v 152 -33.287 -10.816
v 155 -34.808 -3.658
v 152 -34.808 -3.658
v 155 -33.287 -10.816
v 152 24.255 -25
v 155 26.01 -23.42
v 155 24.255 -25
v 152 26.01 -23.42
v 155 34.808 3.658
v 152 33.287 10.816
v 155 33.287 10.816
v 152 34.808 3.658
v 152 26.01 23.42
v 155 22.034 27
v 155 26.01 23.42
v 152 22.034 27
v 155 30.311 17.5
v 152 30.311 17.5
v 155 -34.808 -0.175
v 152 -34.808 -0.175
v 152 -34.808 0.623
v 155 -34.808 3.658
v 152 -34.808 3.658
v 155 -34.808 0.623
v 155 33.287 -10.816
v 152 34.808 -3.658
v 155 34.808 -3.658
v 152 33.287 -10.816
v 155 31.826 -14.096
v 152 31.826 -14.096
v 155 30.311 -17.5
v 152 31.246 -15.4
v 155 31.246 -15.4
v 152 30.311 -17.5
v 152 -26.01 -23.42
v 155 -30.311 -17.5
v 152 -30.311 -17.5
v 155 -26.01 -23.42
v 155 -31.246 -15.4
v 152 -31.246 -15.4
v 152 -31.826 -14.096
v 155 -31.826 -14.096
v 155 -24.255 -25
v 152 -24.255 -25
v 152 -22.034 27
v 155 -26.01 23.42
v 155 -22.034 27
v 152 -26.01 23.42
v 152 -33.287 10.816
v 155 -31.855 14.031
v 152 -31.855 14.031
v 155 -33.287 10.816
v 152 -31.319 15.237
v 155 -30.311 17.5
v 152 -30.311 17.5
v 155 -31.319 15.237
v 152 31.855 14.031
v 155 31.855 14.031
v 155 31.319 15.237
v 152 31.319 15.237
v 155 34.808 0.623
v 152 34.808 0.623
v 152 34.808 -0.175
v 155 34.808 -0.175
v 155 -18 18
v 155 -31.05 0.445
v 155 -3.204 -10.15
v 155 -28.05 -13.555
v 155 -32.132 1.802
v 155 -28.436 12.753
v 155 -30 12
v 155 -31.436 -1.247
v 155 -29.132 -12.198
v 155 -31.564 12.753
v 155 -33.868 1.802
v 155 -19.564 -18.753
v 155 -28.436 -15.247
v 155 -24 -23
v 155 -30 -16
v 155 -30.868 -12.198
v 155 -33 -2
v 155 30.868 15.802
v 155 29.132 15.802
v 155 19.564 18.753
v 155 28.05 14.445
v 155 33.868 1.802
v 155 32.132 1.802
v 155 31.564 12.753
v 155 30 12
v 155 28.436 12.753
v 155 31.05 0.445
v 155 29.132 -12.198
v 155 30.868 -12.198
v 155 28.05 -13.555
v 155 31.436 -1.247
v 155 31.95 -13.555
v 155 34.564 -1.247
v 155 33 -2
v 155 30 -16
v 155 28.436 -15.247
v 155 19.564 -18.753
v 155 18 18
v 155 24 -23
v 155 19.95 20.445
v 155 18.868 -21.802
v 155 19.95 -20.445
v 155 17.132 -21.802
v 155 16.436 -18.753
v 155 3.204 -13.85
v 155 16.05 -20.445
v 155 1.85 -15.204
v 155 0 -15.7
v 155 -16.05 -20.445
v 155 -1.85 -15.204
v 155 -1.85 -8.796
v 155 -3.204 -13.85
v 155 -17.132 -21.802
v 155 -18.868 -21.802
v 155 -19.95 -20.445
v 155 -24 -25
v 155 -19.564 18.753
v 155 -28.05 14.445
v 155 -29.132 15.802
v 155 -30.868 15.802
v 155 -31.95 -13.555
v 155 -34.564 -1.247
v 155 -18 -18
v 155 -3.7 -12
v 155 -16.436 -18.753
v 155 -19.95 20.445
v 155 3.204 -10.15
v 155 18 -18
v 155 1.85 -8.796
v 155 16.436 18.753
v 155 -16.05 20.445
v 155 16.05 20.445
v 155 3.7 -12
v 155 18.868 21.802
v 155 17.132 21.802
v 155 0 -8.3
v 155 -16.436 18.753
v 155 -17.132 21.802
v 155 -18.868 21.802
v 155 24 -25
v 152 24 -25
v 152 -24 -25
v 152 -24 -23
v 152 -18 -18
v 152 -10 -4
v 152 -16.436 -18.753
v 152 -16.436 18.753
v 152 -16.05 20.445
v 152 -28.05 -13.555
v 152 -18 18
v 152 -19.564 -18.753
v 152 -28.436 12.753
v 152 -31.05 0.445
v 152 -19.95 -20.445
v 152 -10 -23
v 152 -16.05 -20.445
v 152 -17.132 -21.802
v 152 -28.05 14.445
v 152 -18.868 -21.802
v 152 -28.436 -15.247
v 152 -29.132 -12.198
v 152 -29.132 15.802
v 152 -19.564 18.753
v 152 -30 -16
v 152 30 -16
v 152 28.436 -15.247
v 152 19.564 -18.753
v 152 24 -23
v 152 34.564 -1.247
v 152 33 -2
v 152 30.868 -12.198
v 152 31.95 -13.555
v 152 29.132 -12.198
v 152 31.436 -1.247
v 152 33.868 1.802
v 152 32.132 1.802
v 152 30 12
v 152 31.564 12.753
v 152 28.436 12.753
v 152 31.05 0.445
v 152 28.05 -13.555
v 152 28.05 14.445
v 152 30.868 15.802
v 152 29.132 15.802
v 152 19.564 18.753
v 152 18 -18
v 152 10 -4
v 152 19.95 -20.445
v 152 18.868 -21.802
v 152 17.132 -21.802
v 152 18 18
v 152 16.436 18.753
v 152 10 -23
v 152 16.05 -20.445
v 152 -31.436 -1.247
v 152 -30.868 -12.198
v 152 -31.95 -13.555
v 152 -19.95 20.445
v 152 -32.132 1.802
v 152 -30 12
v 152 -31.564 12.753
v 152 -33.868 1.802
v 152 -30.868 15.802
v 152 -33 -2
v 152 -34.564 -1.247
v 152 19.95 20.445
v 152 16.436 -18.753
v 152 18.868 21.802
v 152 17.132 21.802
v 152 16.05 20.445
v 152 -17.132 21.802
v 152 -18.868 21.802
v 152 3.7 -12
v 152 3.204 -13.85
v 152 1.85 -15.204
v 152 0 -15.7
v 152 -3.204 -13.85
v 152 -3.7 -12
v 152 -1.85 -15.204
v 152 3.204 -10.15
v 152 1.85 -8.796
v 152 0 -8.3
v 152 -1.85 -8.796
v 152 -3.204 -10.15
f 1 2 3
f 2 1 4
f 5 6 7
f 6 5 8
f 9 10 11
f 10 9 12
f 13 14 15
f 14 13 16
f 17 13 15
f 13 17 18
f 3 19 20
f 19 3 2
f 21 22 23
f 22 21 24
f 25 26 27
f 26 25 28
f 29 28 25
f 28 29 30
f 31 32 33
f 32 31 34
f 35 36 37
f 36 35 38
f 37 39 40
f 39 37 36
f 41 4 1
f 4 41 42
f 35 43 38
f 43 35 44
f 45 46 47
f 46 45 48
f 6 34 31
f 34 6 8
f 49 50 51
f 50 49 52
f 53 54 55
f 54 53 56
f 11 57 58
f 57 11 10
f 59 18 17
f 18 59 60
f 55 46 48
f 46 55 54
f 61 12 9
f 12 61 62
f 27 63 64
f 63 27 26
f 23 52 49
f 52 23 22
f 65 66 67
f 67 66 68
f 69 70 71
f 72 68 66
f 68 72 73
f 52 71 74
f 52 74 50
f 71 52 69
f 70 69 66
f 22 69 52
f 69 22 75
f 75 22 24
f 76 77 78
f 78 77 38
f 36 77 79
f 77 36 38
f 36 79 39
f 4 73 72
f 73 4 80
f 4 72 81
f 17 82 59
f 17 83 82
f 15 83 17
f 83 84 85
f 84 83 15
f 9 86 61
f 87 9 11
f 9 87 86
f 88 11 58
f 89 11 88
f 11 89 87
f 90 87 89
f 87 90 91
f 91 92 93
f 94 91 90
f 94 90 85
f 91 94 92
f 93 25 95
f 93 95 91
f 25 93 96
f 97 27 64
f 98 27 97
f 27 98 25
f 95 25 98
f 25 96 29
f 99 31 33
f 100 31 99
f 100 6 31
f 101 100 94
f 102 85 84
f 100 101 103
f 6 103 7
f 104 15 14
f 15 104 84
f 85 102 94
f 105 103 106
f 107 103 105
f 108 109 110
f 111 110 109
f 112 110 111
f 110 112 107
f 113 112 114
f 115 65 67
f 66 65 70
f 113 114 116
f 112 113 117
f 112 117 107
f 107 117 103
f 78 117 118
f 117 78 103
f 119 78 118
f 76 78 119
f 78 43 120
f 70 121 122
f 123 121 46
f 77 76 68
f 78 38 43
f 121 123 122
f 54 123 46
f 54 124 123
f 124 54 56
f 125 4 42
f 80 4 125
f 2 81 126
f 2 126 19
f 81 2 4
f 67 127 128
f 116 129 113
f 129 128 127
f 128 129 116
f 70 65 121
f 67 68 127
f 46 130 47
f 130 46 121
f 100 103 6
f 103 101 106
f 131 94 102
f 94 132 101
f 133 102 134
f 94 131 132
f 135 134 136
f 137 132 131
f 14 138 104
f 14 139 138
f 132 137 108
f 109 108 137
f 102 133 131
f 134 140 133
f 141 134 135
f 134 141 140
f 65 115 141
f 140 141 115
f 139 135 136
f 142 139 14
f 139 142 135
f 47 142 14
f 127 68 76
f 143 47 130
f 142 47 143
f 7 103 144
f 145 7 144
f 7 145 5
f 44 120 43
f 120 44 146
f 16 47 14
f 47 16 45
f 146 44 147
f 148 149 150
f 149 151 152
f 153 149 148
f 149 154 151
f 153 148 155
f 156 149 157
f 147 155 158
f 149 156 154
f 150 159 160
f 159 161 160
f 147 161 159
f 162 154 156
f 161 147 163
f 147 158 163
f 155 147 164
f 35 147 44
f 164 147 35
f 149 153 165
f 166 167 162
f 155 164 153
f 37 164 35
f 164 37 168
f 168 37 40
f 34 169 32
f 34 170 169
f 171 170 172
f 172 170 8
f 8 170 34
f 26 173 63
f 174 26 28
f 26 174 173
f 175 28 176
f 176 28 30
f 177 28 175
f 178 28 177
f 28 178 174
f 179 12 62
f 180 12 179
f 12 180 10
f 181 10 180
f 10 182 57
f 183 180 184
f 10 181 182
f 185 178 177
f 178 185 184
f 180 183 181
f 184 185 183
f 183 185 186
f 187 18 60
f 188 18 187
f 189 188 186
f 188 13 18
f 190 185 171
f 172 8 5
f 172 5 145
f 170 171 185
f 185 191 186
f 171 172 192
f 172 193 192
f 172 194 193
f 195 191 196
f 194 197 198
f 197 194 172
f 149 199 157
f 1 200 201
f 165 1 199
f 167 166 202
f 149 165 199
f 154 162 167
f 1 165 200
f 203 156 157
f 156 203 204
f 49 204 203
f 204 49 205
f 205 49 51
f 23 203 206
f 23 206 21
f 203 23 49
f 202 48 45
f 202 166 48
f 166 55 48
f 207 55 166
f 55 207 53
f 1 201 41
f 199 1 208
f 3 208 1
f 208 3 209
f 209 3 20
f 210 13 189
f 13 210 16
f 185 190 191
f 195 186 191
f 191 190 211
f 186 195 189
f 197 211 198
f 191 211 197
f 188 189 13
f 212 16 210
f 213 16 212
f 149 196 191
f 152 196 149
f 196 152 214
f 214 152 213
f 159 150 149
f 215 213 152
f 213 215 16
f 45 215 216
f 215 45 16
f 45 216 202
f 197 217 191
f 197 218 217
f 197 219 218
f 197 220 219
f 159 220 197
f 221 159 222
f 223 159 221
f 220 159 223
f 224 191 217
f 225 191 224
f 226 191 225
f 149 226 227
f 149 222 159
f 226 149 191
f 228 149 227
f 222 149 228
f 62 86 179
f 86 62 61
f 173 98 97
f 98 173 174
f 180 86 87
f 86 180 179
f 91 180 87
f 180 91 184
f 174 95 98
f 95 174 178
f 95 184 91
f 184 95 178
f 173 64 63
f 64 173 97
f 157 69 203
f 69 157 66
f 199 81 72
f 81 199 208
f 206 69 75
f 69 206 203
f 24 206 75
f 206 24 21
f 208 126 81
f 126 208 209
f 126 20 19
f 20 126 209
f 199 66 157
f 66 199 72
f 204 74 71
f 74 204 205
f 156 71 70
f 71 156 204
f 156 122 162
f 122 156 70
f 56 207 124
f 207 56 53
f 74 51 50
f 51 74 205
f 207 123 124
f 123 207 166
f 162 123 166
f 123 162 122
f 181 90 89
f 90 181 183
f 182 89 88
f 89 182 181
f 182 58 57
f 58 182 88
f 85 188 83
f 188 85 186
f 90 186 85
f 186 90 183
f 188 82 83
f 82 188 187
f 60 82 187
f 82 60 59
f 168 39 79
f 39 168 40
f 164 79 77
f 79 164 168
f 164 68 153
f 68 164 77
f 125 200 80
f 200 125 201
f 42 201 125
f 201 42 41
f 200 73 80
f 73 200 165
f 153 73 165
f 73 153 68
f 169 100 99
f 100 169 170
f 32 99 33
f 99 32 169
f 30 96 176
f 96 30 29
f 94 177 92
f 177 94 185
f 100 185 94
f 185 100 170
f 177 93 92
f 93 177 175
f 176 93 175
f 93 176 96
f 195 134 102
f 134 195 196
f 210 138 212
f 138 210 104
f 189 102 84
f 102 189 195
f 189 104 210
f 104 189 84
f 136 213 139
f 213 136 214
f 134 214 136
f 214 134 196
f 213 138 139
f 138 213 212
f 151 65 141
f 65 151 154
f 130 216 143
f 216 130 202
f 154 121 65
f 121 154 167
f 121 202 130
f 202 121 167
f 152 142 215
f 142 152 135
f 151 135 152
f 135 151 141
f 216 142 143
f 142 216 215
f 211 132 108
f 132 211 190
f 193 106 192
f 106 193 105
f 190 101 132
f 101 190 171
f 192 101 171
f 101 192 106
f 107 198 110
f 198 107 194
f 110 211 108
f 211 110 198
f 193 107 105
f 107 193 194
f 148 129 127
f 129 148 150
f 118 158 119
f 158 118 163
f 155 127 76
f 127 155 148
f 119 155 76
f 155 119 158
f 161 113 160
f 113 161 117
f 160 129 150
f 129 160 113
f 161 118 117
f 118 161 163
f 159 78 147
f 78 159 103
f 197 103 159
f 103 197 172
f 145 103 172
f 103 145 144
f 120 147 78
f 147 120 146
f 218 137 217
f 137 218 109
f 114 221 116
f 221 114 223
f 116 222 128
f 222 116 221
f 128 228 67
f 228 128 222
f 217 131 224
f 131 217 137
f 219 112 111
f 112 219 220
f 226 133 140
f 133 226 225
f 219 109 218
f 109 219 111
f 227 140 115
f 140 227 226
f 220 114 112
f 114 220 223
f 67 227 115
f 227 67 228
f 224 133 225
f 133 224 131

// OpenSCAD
// file: rib.scad
module solid_rib(){
scale(0.42)
linear_extrude(file = "rib/NACA_4415_circles_lighter.dxf",
height = 10, convexity = 10
);
}


module rib(rod_leading,rod_trailing){
difference(){
solid_rib();
translate([12,11,-1])
cylinder(r=rod_leading/2,h=100);

translate([146,5,-1])
cylinder(r=rod_trailing/2,h=100);

}
}

rib(8,6);
// file: right_wing.scad
 
use<rib.scad>;
use <left_wing.scad>



module vrib(){
rotate([90,0,0])
rib(8,6);
}

module rods_right_wing(){

mirror([0,1,0])
rods_left_wing();

}

module right_wing(){
mirror([0,1,0])
left_wing();

}

right_wing();
// file: left_wing.scad
 
use<rib.scad>;

module vrib(){
rotate([90,0,0])
rib(8,6);
}

module rods_left_wing(){

translate([0,-52,0]){
// Rods
translate([0,50,0])
rotate([90,0,0])
translate([12,11,14])
cylinder(r=9/2,h=840);

translate([0,50,0])
rotate([90,0,0])
translate([146,5,14])
cylinder(r=7/2,h=840);

}
}

module left_wing(){

rods_left_wing();

translate([0,-52,0]){


// Ribs
for(i=[0:6])
translate([0,-i*((850-50)/6),0])vrib();
}

}

left_wing();
// file: wings_support.scad
use <wings.scad>;

module rod_supports(){
  difference(){
  union(){
  translate([19+0.5,-24+4+0.5,25]) cube([155-8-30-1,40-1,5]);

  translate([19+0.5-18,-24+4+0.5-10,30]) cube([155-8-30-1+36,40-1+20,18]);
  }
  union(){
    rods_both_wings();
    translate([19.5,-20.5,33]) cube([155-8-30-1,40-1,50]);
    rotate([0,3,0]) translate([19+0.5-18,-24+4+0.5-10,49]) cube([155-8-30-1+36,40-1+20,18]);
  }
  }
}


  //both_wings();

//
//module rod_supports(){
//  // Supports for wing rods (without holes)
//
//difference(){
//union(){
//  // rod suport front (with cover screw holes)
//    translate([1, -40, 7]) cube([18, 80, 17]);
//    translate([1, -3/2, -40]) cube([18, 3, 60]);
//    translate([1, -40, -25]) cube([18, 80, 8]);
//
//  difference(){
//    union(){
//      // rod suport back (with cover screw holes)
//      translate([135, -40, 1]) cube([18, 80, 23]);
//      translate([136, -3/2, -40]) cube([18, 3, 48]);
//    }
//    union(){
//      translate([134, -46/2, 12])
//      cube([19+2, 46, 30]);
//    }
//  }
//}
//  difference(){
//    rotate([0, 90, 0]) cylinder(r = 100 / 2, h = 155);
//    rotate([0, 90, 0]) cylinder(r = 70 / 2, h = 155);
//  }
//}
//
//}
rod_supports();
// file: body_rib.scad
module body_rib_solid(height){
difference(){
  translate([0,-35,-35])cube([height,70,70]);
  union(){
    difference(){
      translate([-1,0,0]) rotate([0,90,0]) cylinder(r=100,h=height+2);
      translate([-1,0,0]) rotate([0,90,0]) cylinder(r=35,h=height+2);
    }
    // Down plane
    translate([-1,-25,-35])cube([height+1,50,10]);
    // Upper plane
    translate([-1,-25,27])cube([height+1,50,30]);
  }
}
}


module body_rib(height){
  difference(){
    body_rib_solid(height);
    scale([1.1,0.7,0.7]) body_rib_solid(height);
  }
}


body_rib(3);
// file: tail.scad
module tail_up_front(){
  translate([0,0,2]){
    difference(){
      union(){
        scale(0.8) translate([500,-65.2,-13]){
          difference(){
            translate([0,-22,0]) scale([0.6,0.4,0.6])
              linear_extrude(file = "tail/front.dxf",height = 200, convexity = 10);
            union(){
              translate([110,60-5,-1])
              cube([36,70+5,20+15]);
              translate([110,60-5,101])
              cube([36,70+5,20]);
              translate([110,60-5,30+15])
              cube([16,70+5,60-15]);
            }
          }
        }
      }
      translate([400,-100,-7.5-300])cube(300);
    }
    translate([0,0,3])tail_upper_socket();
  }
}

module tail_front(){
difference(){
  union(){
    scale(0.8) translate([500,-65.2,-13]){
      difference(){
        translate([0,-22,0]) scale([0.6,0.4,0.6])
          linear_extrude(file = "tail/front.dxf",height = 200, convexity = 10);
        union(){
          translate([110,60-5,-1])
          cube([36,70+5,20+15]);
          translate([110,60-5,101])
          cube([36,70+5,20]);
          translate([110,60-5,30+15])
          cube([16,70+5,60-15]);
        }
      }
    }
  }
  translate([400,-100,-7.501])cube(300);
}

}

module tail_back(){
  scale(0.8) translate([500,-65.2,-13]) {
  difference(){
  scale([0.6,0.3,0.6])
  scale([0.6,1,1])
  translate([120,0,0])
  linear_extrude(file = "tail/back.dxf",height = 200, convexity = 10);
  union(){
    translate([110,60,18+15])
    cube([22,70,120-36-15]);
    translate([110,0,0]) rotate([0,45+14,0]) cube([100,297,300]);
    translate([110,0,-1-5+3]) cube([60,297,11]);
  }
  }
  }

}

module tail_rod(){
      translate([110, 0, -12])rotate([0,90,0])cylinder(r=3.7,h=370);
}

module tail_unstranlated(){
difference(){
union(){
  tail_front();
  tail_back();
}
    translate([120,65,-1])
cylinder(r=2,h=200);

}
}

module tail(){
  difference(){
    tail_unstranlated();
    tail_rod();
  }
}

module tail_socket(){
  difference(){
    translate([450,0,-10]) cube([70,20,5],center=true);
    union(){
      tail_rod();
      translate([450,-7,-100]) cylinder(r=2,h=400);
      translate([475,-8,-100]) cylinder(r=2,h=400);
      translate([425,-6,-100]) cylinder(r=2,h=400);
      translate([450,7,-100]) cylinder(r=2,h=400);
      translate([475,8,-100]) cylinder(r=2,h=400);
      translate([425,6,-100]) cylinder(r=2,h=400);
    }
  }
}

module tail_upper_socket(){
  difference(){
    translate([450,0,-10]) cube([70,20,3],center=true);
    union(){
      translate([450,-7,-100]) cylinder(r=2,h=400);
     translate([475,-8,-100]) cylinder(r=2,h=400);
     translate([425,-6,-100]) cylinder(r=2,h=400);
     translate([450,7,-100]) cylinder(r=2,h=400);
     translate([475,8,-100]) cylinder(r=2,h=400);
     translate([425,6,-100]) cylinder(r=2,h=400);
    }
  }
}

module tail_socket_bottom(){
  back_wheel();
  difference(){
    translate([450,0,-19]) cube([70,20,3],center=true);
    union(){
      tail_rod();
      translate([450,-7,-100]) cylinder(r=2,h=400);
     translate([475,-8,-100]) cylinder(r=2,h=400);
     translate([425,-6,-100]) cylinder(r=2,h=400);
     translate([450,7,-100]) cylinder(r=2,h=400);
     translate([475,8,-100]) cylinder(r=2,h=400);
     translate([425,6,-100]) cylinder(r=2,h=400);
    }
  }
}

module back_wheel(){
difference(){
 translate([470,0,-28]) cube([20,6,20],center=true);
 translate([470-10,-6+12,-28-20]) rotate([0,45,0]) cube([40,40,40],center=true);
}
}

module elevator_fixed(){
difference(){
  union(){
    translate([500*0.8,48/0.7,-66]) rotate([90,0,0])
    scale([0.48,0.24,0.7]) linear_extrude(file = "tail/front.dxf",height = 200, convexity = 10);
  }
  union(){
    tail_rod();
      translate([450,-7,-100]) cylinder(r=2,h=400);
     translate([475,-8,-100]) cylinder(r=2,h=400);
     translate([425,-6,-100]) cylinder(r=2,h=400);
     translate([450,7,-100]) cylinder(r=2,h=400);
     translate([475,8,-100]) cylinder(r=2,h=400);
     translate([425,6,-100]) cylinder(r=2,h=400);
    translate([150,-200,-17-5/2]) cube([1000,1000,5]);
    translate([490,-60,-100]) cube([50,117,300]);
    translate([497,200,-12.5]) rotate([90,0,0]) cylinder(r=1,h=400);
  }
}
}

module elevator(){
  difference(){
    difference(){
      translate([500*0.8-3+35,48/0.7,-66]) rotate([90,0,0]) scale([0.3,0.24,0.7])
      linear_extrude(file = "tail/back.dxf",height = 200, convexity = 10);
      union(){
        translate([150,-200,-17-5/2]) cube([1000,1000,5]);
        translate([490,-90,-100]) cube([16,31,300]);
        translate([490,-60+117+1-2,-100]) cube([16,297,300]);
      }
  }
    translate([497,200,-12.5]) rotate([90,0,0]) cylinder(r=1,h=400);
  }
  
}

module tail_full(){
  tail();
  tail_up_front();
  tail_rod();
  tail_socket();
  tail_socket_bottom();
  elevator_fixed();
  elevator();
}


tail_full();
// file: nose.scad
module nose_one_hole(){
  translate([-25,18,20])
  rotate([0,90,0])
  cylinder(r=2,h=600);
  nose_one_countersunk();
}

module nose_one_countersunk(){
  translate([-30,18,20])
  rotate([0,90,0])
  cylinder(r=3.2,h=20);
}

module nose_one_screw_cylinder(){
  translate([-21,18,20]) rotate([0,90,0]) cylinder(r=3.6,h=21);
}

module nose_screw_cylinders(){
  mirror([0,0,0]) nose_one_screw_cylinder();
  mirror([0,1,0]) nose_one_screw_cylinder();
  mirror([0,0,1]) nose_one_screw_cylinder();
  mirror([0,1,0])mirror([0,0,1]) nose_one_screw_cylinder();
}

module nose_holes(){
  mirror([0,0,0]) nose_one_hole();
  mirror([0,1,0]) nose_one_hole();
  mirror([0,0,1]) nose_one_hole();
  mirror([0,1,0])mirror([0,0,1]) nose_one_hole();
}

module nose(){

difference(){
  nose_no_holes();
  nose_holes();
}

}

module nose_no_holes(){
      nose_screw_cylinders();
translate([155,0,0])
rotate([0,180,0])
  difference(){
    union(){
      difference(){
          translate([155,0,0])
          rotate([0,90,0])
          cylinder(r1=35,r2=15,h=50);

        union(){

          // Inner
          translate([154,0,0])
          rotate([0,90,0])
          cylinder(r1=32,r2=12,h=52);

          // Upper plane
          translate([1,-100,-63+1])
          cube([2000,2000,38]);

          // Down plane
          translate([1,-100,27-3])
          cube([2000,2000,40]);
        }
      }
      // Upper plane
      translate([155+0.1,-25,-27])
      cube([30,50,3]);

      // Down plane
      translate([155+0.1,-25,26-4])
      cube([30,50,3]);

    }

    // Clear perimeter of nose
    difference(){
      translate([155,0,0])
      rotate([0,90,0])
      cylinder(r1=370,r2=170,h=60);

      translate([155,0,0])
      rotate([0,90,0])
      cylinder(r1=35,r2=15,h=50);

    }
  }
}
module 
motor_hole(){
  translate([-70,15.556/2,15.556/2])
  rotate([0,90,0])
  cylinder(r1=2,r2=2,h=100);
}
module motor_holes(){
  mirror([0,0,0])motor_hole();
  mirror([0,1,0])motor_hole();
  mirror([0,0,1])motor_hole();
  mirror([0,1,1])motor_hole();
    translate([-70,0,-17])
    rotate([0,90,0])
    cylinder(r=5,h=100);
}

module motor_plate(){
    difference(){

  translate([0,-35,-30])cube([5,70,70]);
  union(){
  difference(){
    translate([-1,0,0]) rotate([0,90,0]) cylinder(r=100,h=50);
    translate([0,0,0]) rotate([0,90,0]) cylinder(r=35,h=50);
  }
      // Upper plane
      translate([-1,-25,-35])
      cube([30,50,10]);

      // Down plane
      translate([-1,-25,27])
      cube([30,50,30]);



nose_holes();
motor_holes();

  }

    }



}

nose();

motor_plate();
// file: wings.scad
use <left_wing.scad>;
use <right_wing.scad>;



// wings 
dihedral_angle = 10;

module both_wings(){
    translate([2, 10, 27])
	rotate([-dihedral_angle / 2, 0, 0])
	left_wing();
    translate([2, -10, 27])
	rotate([dihedral_angle / 2, 0, 0])
	right_wing();
}

module rods_both_wings(){
    translate([2, 10, 27])
	rotate([-dihedral_angle / 2, 0, 0])
	rods_left_wing();
    translate([2, -10, 27])
	rotate([dihedral_angle / 2, 0, 0])
	rods_right_wing();
}


  


both_wings();
//translate([0,0,30])
//rods_both_wings();
// file: body.scad
use <wings.scad>;
use <nose.scad>;
use <tail.scad>;
use <body_rib.scad>;
use <wings_support.scad>;

module boxing(){

  // First rib
  translate([5,0,0]) body_rib(3);

  // Last rib
  translate([152,0,0]) body_rib_solid(3);

  // Medium rib (if necessary)
  translate([80,0,0]) body_rib(3);

}


module right_cover_support(){
  // Right cover support
  difference(){
    translate([0,60/2-15,14])
    cube([155,10,10]);
    translate([-1,60/2-15-20-6,13])
    rotate([-55,0,0])
    cube([157,30,30]);
  }
}


module front_back_covers(){
  difference(){
    union(){
      rotate([0,90,0]) cylinder(r = 70 / 2, h = 2);
      translate([155-2,0,0]) rotate([0, 90, 0]) cylinder(r = 70 / 2, h = 2);
    }
    translate([-10,-100,24]) cube([200,200,200]);
  }
}

module bottom_plate(){
  translate([0,-24,-25]) cube([155,48,2]);
  translate([8,-24,-25]) cube([10,10,10]);
  translate([8,-24+48-10,-25]) cube([10,10,10]);

  translate([155-10-3.5,-24,-25]) cube([10,10,10]);
  translate([155-10-3.5,-24+48-10,-25]) cube([10,10,10]);
}

module upper_plate(){
translate([0,0,2])
difference(){
  rotate([180,0,0])bottom_plate();
  translate([19,-24+4,20]) cube([155-8-30,40,20]);
}
}


module carbon_fiber_holes(){
  translate([0,33,0])
  rotate([0,90,0])
  cylinder(r=2,h=155);
  translate([0,-33,0])
  rotate([0,90,0])
  cylinder(r=2,h=155);

  translate([0,-30,14])
  rotate([0,90,0])
  cylinder(r=2,h=155);
  translate([0,30,14])
  rotate([0,90,0])
  cylinder(r=2,h=155);

  translate([0,-30,-14])
  rotate([0,90,0])
  cylinder(r=2,h=155);
  translate([0,30,-14])
  rotate([0,90,0])
  cylinder(r=2,h=155);


}

module body(){

    difference() {
      union () {
        boxing();
        //rod_supports();
        //front_back_covers();
        bottom_plate();
        upper_plate();
        tail_rod_support();
        tail_rod_cover();
        carbon_fiber_holes();
        
      }
      union () {
        nose_holes();
        tail_rod();
        tail_rod_screws();
        carbon_fiber_holes();

      }
    }
  }

module tail_rod_screws(){
  translate([121, -7, -50]) cylinder(r=2,h=100);
  mirror([0,1,0])translate([121, -7, -50]) cylinder(r=2,h=100);

  translate([128, -7, -50]) cylinder(r=2,h=100);
  mirror([0,1,0])translate([128, -7, -50]) cylinder(r=2,h=100);
}

module tail_rod_support(){
    translate([134, -10, -24]) cube([18, 20, 20]);
    translate([134-18, -10, -24]) cube([18, 20, 10]);
}

module tail_rod_cover(){
    translate([134-18, -10, -14+2]) cube([16, 20, 8]);
}


  body();
  nose();
  motor_plate();
  both_wings();
  //tail_full();
  tail_rod();
  rod_supports();
// main file
use <body.scad>;
use <wings.scad>;
use <nose.scad>;
use <tail.scad>;
use <body_rib.scad>;


difference(){
union(){
translate([152,0,0]) body_rib_solid(3);

}

union(){
  carbon_fiber_holes();
  nose_holes();
  tail_rod();
  tail_rod_screws();
  tail_rod_support();
  bottom_plate();

}
}
